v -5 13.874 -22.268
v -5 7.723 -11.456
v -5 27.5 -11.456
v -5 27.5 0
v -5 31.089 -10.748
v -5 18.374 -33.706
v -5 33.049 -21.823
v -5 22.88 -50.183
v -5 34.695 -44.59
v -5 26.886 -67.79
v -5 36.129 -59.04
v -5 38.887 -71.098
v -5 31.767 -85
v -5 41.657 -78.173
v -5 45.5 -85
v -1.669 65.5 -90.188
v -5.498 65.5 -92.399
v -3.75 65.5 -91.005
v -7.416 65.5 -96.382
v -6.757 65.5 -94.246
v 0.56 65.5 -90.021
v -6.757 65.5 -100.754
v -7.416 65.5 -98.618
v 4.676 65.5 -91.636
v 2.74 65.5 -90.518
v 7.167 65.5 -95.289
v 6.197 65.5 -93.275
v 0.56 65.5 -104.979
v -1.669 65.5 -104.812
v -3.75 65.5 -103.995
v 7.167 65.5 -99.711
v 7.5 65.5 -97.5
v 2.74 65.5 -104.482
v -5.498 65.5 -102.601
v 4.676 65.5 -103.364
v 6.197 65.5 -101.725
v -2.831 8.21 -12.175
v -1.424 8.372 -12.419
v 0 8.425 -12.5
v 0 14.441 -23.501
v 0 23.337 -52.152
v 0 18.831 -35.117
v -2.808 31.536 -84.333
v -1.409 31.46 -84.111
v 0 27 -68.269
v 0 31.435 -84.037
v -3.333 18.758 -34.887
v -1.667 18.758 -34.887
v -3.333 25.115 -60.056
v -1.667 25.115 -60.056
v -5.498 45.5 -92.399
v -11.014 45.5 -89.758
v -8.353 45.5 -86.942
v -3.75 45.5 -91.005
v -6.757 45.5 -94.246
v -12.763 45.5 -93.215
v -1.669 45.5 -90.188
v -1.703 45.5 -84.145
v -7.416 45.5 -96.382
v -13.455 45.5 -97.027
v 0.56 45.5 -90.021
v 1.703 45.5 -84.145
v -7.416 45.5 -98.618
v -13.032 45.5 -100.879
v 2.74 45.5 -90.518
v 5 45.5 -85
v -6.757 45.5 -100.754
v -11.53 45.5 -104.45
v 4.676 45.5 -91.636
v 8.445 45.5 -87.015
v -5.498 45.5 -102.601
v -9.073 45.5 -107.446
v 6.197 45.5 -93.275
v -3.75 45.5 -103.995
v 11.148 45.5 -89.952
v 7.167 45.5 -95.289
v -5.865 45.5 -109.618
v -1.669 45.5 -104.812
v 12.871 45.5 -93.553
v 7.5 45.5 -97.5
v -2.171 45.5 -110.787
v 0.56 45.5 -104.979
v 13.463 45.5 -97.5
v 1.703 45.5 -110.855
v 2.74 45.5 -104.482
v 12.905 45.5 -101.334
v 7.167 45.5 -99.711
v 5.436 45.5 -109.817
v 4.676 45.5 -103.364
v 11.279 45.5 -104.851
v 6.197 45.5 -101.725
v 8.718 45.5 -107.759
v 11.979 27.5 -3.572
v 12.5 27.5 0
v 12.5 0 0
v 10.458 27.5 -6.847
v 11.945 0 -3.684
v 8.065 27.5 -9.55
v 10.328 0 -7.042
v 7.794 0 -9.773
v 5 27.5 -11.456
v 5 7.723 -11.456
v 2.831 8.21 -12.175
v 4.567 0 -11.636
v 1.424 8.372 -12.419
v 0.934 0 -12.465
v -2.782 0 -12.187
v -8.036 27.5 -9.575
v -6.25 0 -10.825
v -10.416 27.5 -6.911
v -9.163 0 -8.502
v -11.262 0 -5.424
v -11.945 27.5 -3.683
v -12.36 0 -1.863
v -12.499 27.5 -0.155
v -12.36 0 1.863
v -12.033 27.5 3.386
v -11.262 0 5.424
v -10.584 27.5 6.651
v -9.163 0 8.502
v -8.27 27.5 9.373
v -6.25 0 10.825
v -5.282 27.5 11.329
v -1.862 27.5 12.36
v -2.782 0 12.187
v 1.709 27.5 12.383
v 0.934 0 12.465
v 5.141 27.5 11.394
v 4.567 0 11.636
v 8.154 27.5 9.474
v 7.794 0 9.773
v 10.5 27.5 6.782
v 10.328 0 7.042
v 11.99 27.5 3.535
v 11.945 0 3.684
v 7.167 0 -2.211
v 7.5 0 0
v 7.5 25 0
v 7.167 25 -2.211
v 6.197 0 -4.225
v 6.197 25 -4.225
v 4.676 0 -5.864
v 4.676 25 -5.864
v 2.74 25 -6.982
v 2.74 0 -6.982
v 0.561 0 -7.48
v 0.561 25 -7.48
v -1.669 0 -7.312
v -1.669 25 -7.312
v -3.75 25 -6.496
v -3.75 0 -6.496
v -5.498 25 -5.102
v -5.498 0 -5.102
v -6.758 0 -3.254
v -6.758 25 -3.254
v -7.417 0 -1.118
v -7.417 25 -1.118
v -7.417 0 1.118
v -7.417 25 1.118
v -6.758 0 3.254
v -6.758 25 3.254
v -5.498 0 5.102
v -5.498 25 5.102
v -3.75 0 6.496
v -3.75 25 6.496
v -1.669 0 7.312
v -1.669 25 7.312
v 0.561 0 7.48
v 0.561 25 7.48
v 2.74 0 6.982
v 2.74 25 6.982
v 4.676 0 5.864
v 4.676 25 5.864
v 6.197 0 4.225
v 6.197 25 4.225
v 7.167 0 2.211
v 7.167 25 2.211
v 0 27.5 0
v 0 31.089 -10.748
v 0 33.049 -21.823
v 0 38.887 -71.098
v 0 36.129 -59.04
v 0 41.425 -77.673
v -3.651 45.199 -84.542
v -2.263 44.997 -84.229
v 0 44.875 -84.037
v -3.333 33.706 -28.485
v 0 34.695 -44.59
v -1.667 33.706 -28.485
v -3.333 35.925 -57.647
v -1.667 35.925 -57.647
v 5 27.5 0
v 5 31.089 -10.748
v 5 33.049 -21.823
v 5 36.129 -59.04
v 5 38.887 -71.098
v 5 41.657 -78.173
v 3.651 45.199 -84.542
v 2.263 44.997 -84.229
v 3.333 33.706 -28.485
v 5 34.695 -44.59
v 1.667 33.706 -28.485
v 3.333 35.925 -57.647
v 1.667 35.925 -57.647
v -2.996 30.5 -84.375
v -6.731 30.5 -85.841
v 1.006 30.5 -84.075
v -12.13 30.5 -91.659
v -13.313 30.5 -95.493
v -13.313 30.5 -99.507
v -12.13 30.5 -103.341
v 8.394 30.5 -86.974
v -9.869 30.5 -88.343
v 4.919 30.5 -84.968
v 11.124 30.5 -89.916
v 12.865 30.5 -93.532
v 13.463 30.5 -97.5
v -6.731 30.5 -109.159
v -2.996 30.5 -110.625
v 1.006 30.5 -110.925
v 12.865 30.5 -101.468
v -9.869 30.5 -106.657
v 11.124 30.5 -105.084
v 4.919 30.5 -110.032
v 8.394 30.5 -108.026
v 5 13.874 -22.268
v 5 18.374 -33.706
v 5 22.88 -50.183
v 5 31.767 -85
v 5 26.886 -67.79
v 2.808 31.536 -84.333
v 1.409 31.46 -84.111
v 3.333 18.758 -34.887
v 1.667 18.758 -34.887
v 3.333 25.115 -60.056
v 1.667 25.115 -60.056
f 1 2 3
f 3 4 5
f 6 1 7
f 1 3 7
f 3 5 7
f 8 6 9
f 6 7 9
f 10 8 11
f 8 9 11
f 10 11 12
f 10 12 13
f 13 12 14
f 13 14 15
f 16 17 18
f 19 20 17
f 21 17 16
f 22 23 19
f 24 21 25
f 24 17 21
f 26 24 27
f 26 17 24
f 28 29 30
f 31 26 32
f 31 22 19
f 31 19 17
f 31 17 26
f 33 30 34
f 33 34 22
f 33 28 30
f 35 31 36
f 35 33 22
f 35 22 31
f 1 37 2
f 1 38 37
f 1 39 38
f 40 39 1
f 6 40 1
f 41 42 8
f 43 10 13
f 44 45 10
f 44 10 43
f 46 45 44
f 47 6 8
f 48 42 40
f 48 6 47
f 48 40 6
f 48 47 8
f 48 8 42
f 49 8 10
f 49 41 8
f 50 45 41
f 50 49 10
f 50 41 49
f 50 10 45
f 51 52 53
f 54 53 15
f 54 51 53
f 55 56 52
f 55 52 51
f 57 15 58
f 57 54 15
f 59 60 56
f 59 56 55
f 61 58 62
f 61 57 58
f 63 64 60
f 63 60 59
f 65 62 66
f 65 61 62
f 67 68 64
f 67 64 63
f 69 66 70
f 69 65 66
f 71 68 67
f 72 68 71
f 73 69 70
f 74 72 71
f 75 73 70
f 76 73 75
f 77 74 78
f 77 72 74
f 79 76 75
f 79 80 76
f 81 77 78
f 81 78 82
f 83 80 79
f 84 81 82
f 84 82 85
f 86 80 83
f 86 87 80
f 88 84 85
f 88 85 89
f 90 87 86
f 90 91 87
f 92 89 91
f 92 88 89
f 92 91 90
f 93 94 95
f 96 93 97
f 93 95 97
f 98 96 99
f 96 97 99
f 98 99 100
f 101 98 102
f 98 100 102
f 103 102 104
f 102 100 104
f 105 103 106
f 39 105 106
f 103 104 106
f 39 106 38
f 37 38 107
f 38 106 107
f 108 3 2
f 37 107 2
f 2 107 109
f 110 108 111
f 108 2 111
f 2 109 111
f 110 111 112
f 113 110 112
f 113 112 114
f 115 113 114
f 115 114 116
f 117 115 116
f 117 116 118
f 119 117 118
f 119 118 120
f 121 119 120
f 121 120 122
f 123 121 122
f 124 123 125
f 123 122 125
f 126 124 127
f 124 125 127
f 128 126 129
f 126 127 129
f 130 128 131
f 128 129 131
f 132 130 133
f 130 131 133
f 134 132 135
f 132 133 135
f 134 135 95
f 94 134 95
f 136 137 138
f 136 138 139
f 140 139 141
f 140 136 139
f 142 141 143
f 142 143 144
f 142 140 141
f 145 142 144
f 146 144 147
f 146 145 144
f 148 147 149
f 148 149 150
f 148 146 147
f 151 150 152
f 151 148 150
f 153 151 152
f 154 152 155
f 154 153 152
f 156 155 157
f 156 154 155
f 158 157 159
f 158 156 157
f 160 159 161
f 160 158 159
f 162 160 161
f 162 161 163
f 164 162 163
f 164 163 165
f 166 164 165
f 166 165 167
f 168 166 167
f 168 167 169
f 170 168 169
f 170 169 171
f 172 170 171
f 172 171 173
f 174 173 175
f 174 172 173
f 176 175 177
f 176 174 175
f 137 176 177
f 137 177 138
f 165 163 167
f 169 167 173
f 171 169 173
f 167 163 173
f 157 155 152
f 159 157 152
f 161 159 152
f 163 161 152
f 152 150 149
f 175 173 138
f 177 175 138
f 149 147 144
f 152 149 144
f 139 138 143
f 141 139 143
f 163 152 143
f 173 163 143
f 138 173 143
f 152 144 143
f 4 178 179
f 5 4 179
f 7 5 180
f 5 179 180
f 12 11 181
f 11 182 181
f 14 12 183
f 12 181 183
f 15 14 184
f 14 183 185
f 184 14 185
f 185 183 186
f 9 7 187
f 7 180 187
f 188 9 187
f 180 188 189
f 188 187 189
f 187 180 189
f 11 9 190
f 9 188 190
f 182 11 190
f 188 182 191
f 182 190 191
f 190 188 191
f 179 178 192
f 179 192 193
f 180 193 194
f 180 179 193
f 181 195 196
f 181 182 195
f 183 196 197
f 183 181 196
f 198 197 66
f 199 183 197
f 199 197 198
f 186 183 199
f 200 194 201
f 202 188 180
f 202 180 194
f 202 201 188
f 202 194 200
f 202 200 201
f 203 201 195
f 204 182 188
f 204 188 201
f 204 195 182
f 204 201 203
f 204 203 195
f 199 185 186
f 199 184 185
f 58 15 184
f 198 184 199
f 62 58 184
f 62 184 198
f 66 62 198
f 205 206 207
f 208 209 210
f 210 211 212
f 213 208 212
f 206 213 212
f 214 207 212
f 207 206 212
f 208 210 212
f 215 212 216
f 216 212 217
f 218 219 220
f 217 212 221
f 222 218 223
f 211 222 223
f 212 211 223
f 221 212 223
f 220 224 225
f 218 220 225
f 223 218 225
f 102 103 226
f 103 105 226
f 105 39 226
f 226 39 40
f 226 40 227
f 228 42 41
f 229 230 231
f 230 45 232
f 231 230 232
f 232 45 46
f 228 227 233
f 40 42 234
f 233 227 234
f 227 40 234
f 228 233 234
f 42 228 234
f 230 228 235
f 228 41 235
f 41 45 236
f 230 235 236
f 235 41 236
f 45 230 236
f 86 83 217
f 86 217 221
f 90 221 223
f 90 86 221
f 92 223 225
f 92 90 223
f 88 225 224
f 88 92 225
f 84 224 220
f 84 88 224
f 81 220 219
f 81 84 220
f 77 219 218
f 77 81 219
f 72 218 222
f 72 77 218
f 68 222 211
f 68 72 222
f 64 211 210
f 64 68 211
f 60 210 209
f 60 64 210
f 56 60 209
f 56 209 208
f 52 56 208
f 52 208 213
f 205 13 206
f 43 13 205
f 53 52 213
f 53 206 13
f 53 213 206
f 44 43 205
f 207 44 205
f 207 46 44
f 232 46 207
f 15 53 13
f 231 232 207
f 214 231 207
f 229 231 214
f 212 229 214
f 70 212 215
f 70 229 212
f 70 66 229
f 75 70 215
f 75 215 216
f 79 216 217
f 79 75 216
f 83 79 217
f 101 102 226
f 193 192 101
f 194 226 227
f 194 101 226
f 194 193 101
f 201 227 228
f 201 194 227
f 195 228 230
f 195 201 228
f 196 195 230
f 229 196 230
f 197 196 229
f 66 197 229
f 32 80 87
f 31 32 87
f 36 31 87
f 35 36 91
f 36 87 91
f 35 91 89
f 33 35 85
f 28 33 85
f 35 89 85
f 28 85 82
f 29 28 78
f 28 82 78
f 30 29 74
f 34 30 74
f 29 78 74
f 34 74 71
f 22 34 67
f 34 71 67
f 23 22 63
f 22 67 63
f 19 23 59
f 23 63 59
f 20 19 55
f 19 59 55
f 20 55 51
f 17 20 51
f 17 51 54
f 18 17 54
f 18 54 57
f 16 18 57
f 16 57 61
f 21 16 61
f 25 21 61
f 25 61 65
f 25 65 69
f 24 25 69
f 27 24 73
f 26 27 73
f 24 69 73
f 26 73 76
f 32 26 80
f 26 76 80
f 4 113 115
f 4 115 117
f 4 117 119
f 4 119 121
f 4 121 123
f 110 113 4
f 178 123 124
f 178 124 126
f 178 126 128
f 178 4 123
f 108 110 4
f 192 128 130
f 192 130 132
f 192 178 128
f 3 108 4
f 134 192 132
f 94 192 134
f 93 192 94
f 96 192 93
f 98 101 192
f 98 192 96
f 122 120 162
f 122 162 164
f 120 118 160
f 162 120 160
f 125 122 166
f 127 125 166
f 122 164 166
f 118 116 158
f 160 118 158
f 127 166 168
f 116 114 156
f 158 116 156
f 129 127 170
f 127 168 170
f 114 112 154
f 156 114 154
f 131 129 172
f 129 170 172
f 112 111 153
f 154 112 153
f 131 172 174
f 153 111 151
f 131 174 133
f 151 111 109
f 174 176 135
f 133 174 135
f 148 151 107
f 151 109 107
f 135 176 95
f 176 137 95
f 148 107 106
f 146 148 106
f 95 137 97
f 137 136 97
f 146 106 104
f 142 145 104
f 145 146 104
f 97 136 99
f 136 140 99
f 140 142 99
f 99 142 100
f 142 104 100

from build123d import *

# Parameters (mm, degrees)
SKETCH1_R           = 12.5
SKETCH1_R_2         = 7.5005
BOSS_EXTRUDE1_DEPTH = 25
BOSS_EXTRUDE2_START = 25
SKETCH1_3_R         = 12.5
SKETCH1_3_R_2       = 7.5005
BOSS_EXTRUDE2_DEPTH = 2.5
BOSS_EXTRUDE5_DEPTH = 5
SKETCH3_R           = 13.462912018
BOSS_EXTRUDE6_DEPTH = 15
SKETCH4_R           = 7.5
BOSS_EXTRUDE7_DEPTH = 20


with BuildPart() as part:
    # Sketch1 → Boss-Extrude1 (new body)
    with BuildSketch(Plane(origin=(0, 0, 0), x_dir=(1, 0, 0), z_dir=(0, 1, 0))):
        Circle(SKETCH1_R)
        Circle(SKETCH1_R_2, mode=Mode.SUBTRACT)
    extrude(amount=BOSS_EXTRUDE1_DEPTH)

    # Sketch1<3> → Boss-Extrude2 (add)
    with BuildSketch(Plane(origin=(0, 0, 0), x_dir=(1, 0, 0), z_dir=(0, 1, 0)).offset(BOSS_EXTRUDE2_START)):
        Circle(SKETCH1_3_R)
        Circle(SKETCH1_3_R_2, mode=Mode.SUBTRACT)
        Circle(SKETCH1_3_R_2)
    extrude(amount=BOSS_EXTRUDE2_DEPTH)

    # Sketch2 → Boss-Extrude5 (add, symmetric)
    with BuildSketch(Plane(origin=(0, 0, 0), x_dir=(0, 0, -1), z_dir=(1, 0, 0))):
        with BuildLine():
            Line((110, 45.5), (85, 45.5))
            add(Edge.make_bspline(
                [(0, 27.5), (27.318342435, 39.481167594), (59.380064257, 28.466617173), (85, 45.5)],
                knots=[0, 0, 0, 0, 1, 1, 1, 1], degree=3))
            Line((0, 27.5), (10.078558278, 27.5))
            Line((10.078558278, 27.5), (10.078558278, 6.752961332))
            add(Edge.make_bspline(
                [(10.078558278, 6.752961332), (40.207506706, 28.515228395), (81.426628227, 21.377572534), (110, 45.5)],
                knots=[0, 0, 0, 0, 1, 1, 1, 1], degree=3))
        make_face()
    extrude(amount=BOSS_EXTRUDE5_DEPTH, both=True)

    # Sketch3 → Boss-Extrude6 (add)
    with BuildSketch(Plane(origin=(0, 45.5, 0), x_dir=(1, 0, 0), z_dir=(0, 1, 0))):
        with Locations((0, 97.5)):
            Circle(SKETCH3_R)
    extrude(amount=-BOSS_EXTRUDE6_DEPTH)

    # Sketch4 → Boss-Extrude7 (add)
    with BuildSketch(Plane(origin=(0, 45.5, 0), x_dir=(1, 0, 0), z_dir=(0, 1, 0))):
        with Locations((0, 97.5)):
            Circle(SKETCH4_R)
    extrude(amount=BOSS_EXTRUDE7_DEPTH)


solid = part.part
